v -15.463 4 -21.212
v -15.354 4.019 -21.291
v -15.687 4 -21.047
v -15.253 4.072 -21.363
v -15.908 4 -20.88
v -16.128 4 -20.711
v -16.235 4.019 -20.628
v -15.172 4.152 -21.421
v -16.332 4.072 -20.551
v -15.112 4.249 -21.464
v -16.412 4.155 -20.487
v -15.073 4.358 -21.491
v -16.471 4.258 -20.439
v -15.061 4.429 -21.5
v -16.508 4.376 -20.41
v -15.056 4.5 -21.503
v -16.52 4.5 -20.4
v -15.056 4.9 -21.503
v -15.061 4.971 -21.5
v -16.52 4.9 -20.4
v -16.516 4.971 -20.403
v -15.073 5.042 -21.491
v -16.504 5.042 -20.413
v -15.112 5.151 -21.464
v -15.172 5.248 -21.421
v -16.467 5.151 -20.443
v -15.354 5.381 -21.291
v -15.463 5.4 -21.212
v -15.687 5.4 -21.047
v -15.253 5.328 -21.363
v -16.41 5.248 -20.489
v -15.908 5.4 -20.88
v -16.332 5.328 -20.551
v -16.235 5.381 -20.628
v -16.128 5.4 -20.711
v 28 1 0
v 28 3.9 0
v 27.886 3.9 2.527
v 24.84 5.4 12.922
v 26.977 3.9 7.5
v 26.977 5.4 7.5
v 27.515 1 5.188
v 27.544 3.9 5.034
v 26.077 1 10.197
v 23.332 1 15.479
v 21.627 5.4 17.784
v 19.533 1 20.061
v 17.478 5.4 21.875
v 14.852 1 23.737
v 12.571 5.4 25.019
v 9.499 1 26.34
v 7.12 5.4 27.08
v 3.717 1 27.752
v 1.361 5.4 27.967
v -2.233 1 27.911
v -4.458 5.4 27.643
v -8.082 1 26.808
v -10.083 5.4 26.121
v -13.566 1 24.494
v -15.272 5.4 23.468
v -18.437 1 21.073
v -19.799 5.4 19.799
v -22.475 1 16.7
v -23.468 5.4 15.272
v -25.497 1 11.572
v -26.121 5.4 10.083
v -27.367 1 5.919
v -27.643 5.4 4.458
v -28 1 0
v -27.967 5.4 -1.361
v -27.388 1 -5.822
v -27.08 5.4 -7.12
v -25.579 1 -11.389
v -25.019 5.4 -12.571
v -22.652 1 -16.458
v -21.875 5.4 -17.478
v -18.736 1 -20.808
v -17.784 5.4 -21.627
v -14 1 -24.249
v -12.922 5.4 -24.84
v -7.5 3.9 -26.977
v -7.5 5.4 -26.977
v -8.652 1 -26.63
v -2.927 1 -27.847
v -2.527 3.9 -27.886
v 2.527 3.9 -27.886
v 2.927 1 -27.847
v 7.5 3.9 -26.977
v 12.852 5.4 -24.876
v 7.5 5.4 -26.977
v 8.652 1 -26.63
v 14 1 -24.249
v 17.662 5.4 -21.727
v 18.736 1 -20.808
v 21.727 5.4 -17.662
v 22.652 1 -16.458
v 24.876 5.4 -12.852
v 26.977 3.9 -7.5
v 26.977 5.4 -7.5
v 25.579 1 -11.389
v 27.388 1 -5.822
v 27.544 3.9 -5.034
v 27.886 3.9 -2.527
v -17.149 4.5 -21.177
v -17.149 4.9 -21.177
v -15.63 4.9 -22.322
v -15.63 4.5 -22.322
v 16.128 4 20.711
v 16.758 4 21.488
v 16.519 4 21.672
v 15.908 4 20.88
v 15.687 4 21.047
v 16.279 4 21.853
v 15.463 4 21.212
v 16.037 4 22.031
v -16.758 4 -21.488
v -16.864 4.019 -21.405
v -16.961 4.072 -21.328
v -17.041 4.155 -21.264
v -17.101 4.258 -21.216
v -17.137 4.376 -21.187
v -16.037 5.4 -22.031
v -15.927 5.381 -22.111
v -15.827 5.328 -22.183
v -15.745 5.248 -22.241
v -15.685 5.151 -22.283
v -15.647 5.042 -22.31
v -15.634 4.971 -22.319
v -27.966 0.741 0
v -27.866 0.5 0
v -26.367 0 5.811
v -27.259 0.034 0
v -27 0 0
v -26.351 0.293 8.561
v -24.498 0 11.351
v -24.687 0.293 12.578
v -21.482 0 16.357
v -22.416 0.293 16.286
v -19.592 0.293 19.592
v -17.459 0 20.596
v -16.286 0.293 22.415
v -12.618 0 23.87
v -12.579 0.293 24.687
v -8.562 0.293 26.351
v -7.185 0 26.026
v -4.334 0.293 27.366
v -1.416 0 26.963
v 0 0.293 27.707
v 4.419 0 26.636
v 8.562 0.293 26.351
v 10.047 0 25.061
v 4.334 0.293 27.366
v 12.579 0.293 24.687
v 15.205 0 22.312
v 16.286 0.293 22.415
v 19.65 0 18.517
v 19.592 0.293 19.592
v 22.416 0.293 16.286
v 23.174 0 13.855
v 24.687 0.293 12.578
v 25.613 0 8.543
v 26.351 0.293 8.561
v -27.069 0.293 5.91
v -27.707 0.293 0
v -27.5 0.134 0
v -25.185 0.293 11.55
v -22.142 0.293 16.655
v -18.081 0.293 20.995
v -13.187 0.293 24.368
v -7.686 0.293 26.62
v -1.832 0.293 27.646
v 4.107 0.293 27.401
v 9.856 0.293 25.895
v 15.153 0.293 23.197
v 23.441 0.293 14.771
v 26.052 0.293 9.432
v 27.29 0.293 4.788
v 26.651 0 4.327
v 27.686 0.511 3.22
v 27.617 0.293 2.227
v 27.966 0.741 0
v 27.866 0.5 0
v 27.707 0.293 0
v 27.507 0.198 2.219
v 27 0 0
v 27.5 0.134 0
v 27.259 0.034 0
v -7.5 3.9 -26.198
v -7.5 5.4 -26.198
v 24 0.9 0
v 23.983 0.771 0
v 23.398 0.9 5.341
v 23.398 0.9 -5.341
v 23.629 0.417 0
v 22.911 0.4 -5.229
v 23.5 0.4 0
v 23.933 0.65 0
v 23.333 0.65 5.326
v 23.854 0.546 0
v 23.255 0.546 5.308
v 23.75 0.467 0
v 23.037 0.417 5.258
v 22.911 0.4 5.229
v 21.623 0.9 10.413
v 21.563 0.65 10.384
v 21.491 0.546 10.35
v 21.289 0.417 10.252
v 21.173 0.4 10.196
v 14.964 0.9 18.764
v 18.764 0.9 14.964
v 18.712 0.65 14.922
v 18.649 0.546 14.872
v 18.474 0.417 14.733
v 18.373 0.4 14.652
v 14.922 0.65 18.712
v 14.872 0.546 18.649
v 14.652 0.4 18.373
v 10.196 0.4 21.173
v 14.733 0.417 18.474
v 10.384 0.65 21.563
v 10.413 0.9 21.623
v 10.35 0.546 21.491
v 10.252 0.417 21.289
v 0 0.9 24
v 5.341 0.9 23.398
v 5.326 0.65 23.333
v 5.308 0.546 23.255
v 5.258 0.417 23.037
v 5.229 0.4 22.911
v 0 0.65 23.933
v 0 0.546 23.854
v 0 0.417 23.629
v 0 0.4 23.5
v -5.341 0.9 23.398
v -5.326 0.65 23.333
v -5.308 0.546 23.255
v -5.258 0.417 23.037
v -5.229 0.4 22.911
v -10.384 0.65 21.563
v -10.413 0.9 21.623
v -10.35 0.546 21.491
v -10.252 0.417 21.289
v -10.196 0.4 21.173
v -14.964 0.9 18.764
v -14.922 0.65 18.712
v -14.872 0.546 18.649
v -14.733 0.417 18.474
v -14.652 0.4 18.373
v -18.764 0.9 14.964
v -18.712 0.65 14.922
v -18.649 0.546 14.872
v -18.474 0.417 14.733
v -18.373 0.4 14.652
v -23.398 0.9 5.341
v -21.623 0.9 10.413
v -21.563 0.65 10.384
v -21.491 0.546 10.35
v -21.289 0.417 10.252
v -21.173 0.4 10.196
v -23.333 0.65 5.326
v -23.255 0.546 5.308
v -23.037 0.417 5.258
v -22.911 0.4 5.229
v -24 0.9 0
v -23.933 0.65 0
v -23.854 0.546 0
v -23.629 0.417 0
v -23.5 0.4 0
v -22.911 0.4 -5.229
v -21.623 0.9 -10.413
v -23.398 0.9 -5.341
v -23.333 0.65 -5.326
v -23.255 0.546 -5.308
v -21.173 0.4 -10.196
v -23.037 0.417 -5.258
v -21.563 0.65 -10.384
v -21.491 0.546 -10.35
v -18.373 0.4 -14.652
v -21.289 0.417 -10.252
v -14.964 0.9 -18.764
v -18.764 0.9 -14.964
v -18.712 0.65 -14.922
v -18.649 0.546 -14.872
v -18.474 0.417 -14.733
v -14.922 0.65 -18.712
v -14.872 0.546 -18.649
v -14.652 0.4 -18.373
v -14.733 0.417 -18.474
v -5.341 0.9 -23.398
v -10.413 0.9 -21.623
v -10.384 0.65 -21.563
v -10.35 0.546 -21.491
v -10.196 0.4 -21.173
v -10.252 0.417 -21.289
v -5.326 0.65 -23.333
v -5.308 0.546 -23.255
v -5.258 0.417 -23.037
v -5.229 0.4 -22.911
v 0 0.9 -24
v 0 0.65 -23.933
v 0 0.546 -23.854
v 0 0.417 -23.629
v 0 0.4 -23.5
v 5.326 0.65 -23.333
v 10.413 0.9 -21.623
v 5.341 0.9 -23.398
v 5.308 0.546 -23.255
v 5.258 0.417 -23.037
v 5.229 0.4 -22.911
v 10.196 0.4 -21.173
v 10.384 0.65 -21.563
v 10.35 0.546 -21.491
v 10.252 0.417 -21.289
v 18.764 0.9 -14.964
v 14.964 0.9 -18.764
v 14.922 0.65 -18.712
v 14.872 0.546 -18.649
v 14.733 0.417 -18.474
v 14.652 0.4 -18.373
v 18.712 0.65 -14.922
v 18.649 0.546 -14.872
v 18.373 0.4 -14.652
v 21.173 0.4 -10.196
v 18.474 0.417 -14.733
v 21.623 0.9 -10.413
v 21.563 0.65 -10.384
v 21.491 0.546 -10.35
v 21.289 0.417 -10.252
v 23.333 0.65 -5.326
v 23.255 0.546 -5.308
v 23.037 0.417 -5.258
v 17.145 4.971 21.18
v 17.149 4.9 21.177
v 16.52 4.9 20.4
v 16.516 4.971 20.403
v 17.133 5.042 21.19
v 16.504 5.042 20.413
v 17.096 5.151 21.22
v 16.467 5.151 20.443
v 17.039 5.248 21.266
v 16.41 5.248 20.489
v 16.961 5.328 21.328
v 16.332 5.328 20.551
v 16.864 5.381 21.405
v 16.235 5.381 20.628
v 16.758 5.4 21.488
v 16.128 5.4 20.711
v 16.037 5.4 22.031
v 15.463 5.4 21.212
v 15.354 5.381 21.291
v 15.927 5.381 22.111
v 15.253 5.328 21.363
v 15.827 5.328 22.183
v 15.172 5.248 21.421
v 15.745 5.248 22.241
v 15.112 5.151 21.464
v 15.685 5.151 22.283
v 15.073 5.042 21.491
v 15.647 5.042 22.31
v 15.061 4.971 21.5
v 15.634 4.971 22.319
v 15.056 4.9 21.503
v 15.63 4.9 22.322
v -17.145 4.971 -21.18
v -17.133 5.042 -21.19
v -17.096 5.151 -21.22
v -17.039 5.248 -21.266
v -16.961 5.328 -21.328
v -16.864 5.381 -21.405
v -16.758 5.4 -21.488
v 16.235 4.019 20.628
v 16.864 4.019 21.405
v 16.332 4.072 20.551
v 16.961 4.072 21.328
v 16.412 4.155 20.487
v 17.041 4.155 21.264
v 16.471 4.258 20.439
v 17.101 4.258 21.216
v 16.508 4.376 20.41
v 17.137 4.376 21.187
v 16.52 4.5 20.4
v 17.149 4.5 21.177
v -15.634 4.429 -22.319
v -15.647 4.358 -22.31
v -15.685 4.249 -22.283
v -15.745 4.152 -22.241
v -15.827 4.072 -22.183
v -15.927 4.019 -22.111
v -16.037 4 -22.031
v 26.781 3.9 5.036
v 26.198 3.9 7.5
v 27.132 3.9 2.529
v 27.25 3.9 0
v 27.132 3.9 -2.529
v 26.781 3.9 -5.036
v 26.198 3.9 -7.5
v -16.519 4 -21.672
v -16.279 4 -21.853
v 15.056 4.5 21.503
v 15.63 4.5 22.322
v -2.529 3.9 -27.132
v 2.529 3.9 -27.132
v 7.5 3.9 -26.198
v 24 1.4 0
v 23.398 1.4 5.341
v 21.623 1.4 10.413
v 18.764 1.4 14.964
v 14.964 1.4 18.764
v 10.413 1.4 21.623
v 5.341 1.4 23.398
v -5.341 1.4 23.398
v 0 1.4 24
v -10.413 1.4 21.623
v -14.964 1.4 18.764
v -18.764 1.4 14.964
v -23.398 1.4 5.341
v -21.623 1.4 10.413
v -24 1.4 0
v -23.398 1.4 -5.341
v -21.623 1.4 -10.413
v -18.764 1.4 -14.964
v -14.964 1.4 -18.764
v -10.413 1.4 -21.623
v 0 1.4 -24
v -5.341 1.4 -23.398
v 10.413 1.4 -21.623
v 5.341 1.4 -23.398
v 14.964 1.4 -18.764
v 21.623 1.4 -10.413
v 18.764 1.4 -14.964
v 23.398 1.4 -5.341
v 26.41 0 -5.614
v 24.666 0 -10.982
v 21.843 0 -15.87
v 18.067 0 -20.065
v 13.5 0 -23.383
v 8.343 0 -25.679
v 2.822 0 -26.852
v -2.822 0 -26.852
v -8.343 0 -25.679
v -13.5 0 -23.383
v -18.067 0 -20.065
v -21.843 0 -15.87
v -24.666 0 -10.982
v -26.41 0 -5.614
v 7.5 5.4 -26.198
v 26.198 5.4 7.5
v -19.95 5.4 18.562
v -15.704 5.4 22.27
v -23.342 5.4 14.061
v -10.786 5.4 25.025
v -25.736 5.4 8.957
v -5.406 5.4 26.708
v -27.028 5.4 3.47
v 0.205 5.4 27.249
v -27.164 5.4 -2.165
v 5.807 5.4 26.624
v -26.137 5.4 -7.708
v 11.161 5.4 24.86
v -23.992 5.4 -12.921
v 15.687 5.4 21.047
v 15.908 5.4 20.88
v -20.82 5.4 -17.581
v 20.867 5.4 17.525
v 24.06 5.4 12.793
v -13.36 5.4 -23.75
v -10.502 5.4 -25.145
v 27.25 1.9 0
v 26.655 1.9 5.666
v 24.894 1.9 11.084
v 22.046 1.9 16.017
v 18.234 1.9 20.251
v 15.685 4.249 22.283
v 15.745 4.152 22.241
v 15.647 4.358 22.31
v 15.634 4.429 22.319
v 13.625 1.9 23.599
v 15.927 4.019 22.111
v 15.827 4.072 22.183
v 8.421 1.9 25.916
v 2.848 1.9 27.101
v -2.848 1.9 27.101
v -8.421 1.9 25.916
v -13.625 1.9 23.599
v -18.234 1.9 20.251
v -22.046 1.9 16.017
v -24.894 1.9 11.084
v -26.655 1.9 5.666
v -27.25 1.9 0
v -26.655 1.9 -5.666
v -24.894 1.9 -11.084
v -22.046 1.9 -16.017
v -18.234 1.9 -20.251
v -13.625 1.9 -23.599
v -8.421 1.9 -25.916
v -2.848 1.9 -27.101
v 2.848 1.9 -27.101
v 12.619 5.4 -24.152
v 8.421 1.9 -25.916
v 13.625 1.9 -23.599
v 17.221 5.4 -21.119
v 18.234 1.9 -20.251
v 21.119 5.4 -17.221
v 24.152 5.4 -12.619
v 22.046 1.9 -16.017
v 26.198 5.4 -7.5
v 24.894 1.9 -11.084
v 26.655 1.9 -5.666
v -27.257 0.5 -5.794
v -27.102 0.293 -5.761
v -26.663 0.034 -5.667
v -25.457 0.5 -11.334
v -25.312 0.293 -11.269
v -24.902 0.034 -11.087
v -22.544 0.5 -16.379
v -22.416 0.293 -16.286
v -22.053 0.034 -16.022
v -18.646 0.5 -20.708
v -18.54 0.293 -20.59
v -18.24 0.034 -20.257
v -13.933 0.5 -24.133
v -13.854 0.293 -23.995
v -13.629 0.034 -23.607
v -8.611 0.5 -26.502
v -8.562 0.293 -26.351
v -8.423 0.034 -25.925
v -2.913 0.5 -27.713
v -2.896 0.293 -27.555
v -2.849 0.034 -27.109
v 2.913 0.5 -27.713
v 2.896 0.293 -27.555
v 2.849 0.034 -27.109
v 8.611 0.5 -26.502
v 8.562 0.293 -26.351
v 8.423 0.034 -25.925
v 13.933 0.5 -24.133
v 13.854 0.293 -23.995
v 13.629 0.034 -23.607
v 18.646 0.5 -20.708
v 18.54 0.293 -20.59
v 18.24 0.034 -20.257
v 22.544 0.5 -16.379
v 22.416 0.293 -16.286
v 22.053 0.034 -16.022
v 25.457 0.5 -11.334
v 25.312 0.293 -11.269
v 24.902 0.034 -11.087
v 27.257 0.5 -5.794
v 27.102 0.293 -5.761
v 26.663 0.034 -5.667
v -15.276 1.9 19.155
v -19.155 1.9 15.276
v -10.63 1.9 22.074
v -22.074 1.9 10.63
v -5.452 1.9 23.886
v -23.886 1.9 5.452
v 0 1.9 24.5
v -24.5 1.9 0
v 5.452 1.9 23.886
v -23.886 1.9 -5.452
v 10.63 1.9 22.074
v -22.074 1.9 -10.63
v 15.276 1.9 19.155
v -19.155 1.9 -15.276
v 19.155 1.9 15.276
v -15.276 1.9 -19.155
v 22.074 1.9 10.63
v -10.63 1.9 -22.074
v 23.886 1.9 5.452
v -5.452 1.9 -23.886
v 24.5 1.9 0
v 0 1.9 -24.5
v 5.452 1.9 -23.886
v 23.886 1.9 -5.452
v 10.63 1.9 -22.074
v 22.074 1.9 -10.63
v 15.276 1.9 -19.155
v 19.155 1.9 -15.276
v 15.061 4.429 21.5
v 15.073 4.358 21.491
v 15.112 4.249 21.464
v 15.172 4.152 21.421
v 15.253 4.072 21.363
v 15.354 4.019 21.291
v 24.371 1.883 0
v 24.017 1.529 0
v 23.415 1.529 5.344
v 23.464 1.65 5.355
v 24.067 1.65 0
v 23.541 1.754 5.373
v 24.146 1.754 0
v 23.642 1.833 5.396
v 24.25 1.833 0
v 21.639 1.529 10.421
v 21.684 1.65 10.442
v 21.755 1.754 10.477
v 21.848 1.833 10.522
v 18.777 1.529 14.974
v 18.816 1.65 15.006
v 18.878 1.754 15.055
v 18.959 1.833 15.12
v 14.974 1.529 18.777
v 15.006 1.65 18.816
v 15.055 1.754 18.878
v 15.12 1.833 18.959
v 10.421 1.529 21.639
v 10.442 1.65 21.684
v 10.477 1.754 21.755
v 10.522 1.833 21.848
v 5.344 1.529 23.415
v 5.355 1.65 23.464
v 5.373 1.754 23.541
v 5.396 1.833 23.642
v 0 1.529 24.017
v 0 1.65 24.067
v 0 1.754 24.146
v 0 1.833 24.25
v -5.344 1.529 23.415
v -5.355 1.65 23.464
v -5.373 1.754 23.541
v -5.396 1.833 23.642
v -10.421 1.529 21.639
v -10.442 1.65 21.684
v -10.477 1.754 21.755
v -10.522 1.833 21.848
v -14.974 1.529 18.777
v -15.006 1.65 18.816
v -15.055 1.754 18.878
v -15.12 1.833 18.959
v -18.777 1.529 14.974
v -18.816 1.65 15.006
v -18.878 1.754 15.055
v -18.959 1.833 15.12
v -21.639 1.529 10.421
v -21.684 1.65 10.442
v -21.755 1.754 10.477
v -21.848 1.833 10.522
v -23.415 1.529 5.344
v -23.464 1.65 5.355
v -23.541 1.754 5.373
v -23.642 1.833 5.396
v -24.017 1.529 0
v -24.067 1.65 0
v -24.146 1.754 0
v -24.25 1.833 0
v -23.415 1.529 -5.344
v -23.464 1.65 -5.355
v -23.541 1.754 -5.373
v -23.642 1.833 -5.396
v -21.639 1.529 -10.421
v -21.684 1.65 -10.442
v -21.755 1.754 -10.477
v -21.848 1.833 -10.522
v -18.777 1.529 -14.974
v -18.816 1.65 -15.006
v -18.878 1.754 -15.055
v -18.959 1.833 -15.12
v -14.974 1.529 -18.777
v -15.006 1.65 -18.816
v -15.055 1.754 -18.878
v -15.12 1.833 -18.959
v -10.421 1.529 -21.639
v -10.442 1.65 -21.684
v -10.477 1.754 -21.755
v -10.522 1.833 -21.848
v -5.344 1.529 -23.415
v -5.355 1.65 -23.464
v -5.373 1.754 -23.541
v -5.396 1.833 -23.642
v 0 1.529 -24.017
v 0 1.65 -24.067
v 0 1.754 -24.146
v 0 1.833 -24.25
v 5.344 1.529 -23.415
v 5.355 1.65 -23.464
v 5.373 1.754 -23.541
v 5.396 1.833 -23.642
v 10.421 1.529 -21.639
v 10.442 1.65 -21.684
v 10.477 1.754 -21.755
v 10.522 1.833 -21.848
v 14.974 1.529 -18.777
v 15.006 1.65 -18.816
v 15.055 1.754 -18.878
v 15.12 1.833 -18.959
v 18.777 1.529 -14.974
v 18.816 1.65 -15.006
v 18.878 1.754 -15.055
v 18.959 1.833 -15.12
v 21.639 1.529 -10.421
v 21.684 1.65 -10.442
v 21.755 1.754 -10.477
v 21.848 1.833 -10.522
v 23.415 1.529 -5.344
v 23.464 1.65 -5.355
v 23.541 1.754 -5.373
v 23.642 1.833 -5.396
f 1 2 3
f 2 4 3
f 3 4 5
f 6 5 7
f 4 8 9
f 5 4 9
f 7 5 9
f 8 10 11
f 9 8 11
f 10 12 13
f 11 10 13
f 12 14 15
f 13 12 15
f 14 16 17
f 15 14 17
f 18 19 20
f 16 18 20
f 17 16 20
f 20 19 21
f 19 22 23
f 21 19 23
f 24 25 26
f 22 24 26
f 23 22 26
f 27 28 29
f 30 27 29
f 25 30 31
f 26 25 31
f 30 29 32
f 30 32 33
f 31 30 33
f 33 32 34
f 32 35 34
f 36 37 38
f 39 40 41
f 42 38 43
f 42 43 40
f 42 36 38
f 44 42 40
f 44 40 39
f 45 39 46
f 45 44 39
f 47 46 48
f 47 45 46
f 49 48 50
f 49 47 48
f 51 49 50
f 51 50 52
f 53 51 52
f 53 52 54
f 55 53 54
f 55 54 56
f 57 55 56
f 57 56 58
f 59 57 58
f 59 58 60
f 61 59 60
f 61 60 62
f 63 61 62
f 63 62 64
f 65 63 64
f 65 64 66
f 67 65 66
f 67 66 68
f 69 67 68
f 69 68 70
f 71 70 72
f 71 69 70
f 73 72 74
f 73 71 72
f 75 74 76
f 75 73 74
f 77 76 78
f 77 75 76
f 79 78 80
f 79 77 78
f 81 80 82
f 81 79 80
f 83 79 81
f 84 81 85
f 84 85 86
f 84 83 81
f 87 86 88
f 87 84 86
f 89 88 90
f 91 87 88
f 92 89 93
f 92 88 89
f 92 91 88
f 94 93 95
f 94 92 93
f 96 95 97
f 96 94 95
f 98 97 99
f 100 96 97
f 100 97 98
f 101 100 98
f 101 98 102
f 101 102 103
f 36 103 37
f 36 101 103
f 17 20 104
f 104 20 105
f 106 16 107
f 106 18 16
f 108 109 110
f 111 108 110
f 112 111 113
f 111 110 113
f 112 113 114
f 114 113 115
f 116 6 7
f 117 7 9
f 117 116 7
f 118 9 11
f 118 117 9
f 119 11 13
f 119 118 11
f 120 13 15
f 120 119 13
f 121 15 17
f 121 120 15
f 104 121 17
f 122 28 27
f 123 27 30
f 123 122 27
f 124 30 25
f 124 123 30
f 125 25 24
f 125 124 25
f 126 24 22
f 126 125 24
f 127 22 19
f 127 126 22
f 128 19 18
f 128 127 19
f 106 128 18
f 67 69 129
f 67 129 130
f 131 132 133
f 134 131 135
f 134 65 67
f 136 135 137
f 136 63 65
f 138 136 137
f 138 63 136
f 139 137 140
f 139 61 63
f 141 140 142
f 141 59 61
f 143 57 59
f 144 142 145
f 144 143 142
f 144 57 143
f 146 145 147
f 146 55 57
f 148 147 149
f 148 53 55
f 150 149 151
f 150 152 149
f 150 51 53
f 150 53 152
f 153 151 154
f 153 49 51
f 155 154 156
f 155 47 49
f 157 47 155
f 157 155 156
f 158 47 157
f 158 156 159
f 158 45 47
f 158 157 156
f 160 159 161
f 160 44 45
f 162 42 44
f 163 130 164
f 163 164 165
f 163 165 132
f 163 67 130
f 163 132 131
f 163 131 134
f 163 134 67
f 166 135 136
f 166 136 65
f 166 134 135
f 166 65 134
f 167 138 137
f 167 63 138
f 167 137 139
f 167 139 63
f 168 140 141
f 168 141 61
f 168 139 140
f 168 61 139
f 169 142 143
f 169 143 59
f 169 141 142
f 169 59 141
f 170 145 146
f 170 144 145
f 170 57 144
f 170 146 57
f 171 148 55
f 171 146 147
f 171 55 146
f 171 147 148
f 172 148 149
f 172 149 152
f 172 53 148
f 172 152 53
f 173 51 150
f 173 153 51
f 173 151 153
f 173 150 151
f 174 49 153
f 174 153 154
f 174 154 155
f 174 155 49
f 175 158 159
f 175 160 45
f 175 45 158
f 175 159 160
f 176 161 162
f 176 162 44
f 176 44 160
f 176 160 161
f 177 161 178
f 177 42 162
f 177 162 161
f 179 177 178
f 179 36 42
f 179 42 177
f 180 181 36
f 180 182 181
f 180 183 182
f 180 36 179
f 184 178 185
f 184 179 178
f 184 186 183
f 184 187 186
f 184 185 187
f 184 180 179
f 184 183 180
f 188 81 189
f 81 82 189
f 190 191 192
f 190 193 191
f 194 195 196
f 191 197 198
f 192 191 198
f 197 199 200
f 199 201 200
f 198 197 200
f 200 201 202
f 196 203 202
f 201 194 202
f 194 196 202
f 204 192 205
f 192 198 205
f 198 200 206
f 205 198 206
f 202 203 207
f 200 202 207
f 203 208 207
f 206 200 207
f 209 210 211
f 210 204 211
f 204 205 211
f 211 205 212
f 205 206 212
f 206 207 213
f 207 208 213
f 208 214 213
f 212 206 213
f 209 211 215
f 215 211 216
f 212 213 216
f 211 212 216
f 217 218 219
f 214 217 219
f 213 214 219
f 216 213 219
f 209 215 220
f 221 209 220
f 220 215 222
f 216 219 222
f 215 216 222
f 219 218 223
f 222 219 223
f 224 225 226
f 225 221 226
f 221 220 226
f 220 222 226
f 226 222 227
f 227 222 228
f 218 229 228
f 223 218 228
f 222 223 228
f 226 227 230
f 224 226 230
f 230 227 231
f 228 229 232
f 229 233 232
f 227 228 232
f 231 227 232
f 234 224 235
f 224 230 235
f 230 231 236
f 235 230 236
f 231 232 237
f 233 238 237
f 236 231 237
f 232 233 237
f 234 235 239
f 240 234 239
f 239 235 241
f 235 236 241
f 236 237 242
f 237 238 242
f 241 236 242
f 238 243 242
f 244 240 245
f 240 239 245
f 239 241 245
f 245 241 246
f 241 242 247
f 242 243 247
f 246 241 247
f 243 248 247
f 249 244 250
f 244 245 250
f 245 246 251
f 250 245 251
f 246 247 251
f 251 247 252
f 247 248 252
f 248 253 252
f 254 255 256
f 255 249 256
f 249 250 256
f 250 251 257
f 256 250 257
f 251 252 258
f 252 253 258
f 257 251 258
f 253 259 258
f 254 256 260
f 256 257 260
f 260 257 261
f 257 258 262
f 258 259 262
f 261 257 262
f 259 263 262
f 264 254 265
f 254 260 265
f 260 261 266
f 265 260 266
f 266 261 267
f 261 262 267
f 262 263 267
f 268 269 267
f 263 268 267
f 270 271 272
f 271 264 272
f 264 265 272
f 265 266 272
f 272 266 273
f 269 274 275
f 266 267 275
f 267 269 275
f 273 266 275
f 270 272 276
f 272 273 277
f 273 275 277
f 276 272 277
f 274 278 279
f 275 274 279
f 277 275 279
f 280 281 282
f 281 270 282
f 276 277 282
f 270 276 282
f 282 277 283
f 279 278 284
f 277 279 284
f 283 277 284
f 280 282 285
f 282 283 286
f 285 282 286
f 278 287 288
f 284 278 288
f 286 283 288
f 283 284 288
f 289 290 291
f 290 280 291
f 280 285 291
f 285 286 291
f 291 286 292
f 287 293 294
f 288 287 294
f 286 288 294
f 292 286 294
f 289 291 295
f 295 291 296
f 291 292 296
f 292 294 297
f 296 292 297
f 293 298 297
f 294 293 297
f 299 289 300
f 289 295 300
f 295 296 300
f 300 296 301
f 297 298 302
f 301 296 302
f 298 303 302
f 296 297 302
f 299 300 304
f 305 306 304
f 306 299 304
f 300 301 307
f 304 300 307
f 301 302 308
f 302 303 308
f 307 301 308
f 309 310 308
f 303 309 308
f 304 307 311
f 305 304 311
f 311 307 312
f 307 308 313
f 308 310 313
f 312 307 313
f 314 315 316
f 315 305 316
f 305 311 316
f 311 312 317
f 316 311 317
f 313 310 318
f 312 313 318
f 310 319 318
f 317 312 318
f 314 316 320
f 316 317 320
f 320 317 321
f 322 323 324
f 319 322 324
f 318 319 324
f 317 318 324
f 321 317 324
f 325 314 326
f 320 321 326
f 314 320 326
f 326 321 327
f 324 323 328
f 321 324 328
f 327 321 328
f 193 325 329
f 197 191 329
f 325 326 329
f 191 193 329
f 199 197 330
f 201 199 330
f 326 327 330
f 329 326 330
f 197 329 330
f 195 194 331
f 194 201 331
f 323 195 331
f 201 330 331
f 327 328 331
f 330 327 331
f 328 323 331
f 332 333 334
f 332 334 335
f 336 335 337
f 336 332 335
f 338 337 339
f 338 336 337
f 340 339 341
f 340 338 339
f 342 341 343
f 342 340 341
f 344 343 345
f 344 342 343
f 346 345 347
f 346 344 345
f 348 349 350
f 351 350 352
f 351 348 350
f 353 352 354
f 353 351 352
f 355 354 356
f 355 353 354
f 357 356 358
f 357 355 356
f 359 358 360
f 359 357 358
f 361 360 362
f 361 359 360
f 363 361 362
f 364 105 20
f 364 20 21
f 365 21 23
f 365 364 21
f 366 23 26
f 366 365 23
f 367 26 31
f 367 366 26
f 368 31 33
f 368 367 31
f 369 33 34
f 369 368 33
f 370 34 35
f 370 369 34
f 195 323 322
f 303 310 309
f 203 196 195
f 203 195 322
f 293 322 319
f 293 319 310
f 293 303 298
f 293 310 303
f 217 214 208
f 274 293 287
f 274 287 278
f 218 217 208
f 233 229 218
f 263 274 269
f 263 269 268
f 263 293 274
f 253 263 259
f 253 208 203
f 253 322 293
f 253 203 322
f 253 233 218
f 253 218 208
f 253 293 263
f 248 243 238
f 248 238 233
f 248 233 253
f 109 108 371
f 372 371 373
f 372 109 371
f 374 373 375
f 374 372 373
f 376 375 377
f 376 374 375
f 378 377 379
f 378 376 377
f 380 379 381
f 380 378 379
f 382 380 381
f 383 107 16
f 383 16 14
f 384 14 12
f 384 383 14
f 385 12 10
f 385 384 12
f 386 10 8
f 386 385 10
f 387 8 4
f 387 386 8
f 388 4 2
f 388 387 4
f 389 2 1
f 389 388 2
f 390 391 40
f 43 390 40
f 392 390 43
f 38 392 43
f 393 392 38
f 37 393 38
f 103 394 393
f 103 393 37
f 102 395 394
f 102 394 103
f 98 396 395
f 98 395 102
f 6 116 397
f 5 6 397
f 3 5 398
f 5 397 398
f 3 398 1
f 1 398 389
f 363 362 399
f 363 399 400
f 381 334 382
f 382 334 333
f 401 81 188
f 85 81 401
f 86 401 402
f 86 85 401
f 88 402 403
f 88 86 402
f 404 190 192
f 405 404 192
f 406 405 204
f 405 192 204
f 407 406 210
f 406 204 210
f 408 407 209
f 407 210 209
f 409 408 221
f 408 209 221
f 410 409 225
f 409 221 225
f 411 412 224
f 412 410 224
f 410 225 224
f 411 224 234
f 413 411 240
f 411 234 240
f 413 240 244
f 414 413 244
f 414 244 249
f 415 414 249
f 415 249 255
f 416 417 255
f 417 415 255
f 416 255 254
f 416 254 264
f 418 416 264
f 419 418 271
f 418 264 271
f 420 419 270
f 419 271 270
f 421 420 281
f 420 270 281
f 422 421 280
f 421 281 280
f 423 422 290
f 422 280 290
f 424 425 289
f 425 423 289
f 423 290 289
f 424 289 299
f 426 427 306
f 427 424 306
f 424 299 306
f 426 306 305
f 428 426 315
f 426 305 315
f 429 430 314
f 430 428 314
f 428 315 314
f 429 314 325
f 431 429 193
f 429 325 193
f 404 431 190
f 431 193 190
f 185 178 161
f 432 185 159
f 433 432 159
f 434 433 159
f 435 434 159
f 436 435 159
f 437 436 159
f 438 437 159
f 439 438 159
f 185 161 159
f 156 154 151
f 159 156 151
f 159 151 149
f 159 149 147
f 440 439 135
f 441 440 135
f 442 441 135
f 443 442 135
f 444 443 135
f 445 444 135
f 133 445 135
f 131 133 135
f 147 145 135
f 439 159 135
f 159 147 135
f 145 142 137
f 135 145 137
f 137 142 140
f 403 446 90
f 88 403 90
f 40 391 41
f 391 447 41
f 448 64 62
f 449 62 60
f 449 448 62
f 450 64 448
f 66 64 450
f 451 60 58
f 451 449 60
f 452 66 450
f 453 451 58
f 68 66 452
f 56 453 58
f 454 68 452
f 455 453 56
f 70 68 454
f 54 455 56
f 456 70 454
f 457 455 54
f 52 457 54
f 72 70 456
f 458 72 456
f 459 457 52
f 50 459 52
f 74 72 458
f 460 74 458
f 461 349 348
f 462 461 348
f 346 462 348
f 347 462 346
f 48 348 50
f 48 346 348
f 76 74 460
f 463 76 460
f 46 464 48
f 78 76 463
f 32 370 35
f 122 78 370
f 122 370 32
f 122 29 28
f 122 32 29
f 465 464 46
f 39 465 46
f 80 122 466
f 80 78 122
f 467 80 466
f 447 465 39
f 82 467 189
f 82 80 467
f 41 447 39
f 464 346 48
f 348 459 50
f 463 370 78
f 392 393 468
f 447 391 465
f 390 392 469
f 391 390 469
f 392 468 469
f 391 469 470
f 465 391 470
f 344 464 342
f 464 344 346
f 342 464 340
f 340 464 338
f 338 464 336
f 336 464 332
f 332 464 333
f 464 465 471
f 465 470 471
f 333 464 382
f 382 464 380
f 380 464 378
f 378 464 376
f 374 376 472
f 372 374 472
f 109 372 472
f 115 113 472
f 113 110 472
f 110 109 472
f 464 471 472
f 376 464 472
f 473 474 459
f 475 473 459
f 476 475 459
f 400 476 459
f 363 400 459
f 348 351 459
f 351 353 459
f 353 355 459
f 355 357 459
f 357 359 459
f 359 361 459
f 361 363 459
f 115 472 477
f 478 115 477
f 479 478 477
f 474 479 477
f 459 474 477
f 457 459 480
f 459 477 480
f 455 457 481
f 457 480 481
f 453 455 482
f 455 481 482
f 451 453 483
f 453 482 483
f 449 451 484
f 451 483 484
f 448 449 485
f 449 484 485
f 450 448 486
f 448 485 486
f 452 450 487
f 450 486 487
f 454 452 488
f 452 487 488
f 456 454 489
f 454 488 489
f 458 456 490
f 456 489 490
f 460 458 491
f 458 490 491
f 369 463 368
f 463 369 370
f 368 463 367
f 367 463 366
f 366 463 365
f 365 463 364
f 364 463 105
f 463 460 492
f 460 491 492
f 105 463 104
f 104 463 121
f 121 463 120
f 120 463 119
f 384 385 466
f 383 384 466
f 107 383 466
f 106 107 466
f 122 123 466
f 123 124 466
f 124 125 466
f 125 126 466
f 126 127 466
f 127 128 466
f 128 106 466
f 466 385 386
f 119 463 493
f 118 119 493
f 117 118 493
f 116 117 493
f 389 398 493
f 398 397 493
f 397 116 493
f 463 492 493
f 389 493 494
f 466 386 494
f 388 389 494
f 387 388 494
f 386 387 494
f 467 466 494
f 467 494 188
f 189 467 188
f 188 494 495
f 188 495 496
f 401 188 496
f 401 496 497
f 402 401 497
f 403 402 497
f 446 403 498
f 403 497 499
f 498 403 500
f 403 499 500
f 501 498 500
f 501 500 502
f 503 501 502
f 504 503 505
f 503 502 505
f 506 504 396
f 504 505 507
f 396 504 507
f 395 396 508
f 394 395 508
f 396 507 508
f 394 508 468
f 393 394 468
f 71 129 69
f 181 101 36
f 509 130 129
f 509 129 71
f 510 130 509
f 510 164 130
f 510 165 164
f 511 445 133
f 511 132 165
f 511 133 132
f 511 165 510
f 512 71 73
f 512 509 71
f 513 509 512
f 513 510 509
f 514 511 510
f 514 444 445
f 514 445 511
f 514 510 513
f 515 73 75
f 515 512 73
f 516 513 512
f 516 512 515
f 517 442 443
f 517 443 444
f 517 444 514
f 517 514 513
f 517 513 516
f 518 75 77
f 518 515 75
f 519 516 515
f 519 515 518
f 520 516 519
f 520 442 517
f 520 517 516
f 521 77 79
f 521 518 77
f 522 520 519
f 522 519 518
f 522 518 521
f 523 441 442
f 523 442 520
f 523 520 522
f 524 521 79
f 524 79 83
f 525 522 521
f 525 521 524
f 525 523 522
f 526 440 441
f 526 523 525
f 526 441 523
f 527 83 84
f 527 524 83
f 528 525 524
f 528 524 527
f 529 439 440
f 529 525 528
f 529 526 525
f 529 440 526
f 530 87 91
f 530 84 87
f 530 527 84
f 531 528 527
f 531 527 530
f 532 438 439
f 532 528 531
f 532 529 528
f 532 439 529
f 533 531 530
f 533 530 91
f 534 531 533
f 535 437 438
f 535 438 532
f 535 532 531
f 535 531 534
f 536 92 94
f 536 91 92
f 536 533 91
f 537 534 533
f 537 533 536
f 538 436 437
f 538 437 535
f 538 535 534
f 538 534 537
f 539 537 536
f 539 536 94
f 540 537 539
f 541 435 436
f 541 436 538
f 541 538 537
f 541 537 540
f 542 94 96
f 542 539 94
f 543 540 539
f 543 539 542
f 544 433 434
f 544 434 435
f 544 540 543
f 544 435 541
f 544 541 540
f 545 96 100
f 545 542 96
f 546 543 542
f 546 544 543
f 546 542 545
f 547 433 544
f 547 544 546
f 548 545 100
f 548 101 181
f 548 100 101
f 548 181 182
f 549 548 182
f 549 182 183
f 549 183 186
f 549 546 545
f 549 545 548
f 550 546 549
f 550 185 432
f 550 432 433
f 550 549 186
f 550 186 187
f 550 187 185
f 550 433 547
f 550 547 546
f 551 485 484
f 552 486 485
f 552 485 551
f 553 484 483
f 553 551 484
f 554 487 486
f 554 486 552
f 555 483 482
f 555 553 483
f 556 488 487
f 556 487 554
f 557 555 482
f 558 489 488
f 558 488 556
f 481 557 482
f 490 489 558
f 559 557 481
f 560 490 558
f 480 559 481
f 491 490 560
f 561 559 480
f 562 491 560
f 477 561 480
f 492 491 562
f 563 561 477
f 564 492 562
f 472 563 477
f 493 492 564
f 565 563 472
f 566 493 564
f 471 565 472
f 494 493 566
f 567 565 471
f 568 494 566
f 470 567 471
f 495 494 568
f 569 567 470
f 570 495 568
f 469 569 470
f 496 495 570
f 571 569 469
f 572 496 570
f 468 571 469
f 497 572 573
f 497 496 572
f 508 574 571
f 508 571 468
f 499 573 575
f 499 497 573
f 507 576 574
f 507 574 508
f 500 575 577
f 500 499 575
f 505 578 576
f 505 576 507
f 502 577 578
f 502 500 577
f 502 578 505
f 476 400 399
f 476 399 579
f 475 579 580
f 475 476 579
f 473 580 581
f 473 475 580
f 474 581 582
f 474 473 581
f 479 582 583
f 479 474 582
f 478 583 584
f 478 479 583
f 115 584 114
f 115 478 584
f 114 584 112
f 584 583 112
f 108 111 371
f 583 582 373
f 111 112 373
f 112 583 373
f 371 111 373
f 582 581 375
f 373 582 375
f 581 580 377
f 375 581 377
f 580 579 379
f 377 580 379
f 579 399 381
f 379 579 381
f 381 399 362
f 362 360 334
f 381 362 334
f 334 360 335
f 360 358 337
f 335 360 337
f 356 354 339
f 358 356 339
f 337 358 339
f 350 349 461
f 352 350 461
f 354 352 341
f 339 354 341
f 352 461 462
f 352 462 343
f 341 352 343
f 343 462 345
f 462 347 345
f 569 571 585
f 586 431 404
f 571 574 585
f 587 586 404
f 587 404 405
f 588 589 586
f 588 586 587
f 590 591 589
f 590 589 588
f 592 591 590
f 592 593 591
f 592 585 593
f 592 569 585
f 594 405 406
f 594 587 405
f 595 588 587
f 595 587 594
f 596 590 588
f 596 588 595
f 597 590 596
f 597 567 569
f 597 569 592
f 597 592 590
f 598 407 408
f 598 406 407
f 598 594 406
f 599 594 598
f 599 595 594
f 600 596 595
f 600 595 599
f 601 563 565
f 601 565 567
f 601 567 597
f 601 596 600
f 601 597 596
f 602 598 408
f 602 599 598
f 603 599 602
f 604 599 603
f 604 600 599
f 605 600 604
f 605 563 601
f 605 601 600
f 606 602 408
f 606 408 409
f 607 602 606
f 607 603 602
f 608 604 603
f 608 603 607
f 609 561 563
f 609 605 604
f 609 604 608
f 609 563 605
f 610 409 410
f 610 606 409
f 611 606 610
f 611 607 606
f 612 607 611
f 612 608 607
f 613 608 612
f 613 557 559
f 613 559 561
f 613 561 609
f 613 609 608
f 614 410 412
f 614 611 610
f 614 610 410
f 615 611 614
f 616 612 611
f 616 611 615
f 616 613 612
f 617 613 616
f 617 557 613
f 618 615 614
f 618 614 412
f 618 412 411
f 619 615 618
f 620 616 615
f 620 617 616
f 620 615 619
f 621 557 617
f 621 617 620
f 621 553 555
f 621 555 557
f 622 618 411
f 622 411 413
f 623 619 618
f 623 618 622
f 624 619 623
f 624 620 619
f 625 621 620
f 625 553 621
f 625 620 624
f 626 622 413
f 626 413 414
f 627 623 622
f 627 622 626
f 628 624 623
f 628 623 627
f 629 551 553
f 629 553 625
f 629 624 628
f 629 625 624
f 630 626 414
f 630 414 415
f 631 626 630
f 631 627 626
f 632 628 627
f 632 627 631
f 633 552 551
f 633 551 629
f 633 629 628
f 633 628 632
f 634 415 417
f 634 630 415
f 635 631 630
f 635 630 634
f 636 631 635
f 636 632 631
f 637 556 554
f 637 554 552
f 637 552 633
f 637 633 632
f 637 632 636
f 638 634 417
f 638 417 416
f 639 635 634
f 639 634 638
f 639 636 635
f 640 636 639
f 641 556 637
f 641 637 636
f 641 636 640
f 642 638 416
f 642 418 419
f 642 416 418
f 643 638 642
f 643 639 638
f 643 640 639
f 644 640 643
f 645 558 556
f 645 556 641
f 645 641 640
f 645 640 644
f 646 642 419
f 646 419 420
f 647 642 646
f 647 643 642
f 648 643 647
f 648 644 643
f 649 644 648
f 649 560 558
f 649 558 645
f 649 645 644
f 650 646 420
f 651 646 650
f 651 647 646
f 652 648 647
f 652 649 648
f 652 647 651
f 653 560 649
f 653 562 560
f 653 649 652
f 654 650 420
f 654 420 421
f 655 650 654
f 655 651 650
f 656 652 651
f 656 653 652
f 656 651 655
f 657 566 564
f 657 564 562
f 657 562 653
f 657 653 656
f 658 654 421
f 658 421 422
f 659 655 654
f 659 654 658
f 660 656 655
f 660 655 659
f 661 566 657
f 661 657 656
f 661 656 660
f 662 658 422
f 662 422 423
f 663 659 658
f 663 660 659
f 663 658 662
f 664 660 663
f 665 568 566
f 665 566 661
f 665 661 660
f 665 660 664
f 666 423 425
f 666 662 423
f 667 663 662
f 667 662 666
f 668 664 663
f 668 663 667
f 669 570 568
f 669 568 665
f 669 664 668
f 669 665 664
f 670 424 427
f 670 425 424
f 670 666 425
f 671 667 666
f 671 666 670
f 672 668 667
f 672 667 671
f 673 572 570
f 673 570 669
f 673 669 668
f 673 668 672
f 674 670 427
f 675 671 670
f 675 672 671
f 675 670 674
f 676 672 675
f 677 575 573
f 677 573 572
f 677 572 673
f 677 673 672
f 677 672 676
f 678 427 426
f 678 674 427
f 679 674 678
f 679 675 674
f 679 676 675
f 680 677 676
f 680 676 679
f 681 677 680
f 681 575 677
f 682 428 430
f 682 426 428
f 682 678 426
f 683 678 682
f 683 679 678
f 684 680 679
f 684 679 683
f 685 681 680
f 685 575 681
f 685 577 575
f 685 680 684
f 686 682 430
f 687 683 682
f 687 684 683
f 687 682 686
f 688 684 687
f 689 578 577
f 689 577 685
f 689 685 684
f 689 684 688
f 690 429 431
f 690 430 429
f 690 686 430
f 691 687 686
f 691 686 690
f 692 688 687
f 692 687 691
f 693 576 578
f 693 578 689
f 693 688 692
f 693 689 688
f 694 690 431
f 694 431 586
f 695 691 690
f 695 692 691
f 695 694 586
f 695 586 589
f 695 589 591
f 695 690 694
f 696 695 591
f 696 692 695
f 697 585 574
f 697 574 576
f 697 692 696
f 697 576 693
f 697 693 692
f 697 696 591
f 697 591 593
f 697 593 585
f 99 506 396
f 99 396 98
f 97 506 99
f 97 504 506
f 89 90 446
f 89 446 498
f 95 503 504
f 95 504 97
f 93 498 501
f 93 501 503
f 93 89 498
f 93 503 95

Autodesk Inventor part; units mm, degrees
ref_plane "YZ Plane" through (0, 0, 0) normal (1, 0, 0) x (0, 1, 0)
ref_plane "XZ Plane" through (0, 0, 0) normal (0, 1, 0) x (-1, 0, 0)
ref_plane "XY Plane" through (0, 0, 0) normal (0, 0, 1) x (1, 0, 0)
sketch "Sketch1" plane through (0, 0, 0) normal (0, 1, 0) x (-1, 0, 0)
  circle A0 centre (0, 0) radius 28
  dimension "d7" = 56
extrude "Extrusion1" add sketch "Sketch1" along normal blind 0.4
sketch "Sketch2" plane through (0, 0.4, 0) normal (0, 1, 0) x (1, 0, 0)
  circle A0 centre (0, 0) radius 27.25
  circle A1 centre (0, 0) radius 28
  dimension "d4" = 54.5
  dimension "d8" = 56
extrude "Extrusion2" add sketch "Sketch2" along normal blind 5
sketch "Sketch3" plane through (0, 5.4, 0) normal (0, 1, 0) x (1, 0, 0)
  arc A0 (-15.63, 22.3219) -> (-17.149, 21.1772) centre (0, 0) ccw
  line L0 (0, 0) -> (-17.149, 21.1772) construction
  line L1 (0, 0) -> (27.25, 0) construction
  line L2 (0, 0) -> (-15.63, 22.3219) construction
  arc A1 (-15.0564, 21.5027) -> (-16.5197, 20.4001) centre (0, 0) ccw
  line L3 (0, 0) -> (-16.5197, 20.4001) construction
  line L4 (0, 0) -> (26.25, 0) construction
  line L5 (0, 0) -> (-15.0564, 21.5027) construction
  line L6 (-16.5197, 20.4001) -> (-17.149, 21.1772)
  line L7 (-15.0564, 21.5027) -> (-15.63, 22.3219)
  circle A2 centre (0, 0) radius 27.25 projected
  dimension "d9" = 27.25
  dimension "d10" = 129
  dimension "d11" = 4
  dimension "d12" = 26.25
  dimension "d13" = 129
  dimension "d14" = 4
extrude "Extrusion3" add sketch "Sketch3" against normal blind 1.4 contours L7 A1 L6 A0
fillet "Fillet1" radius 0.5 4 edges at (-15.3432, 4, -21.9123) (-15.3432, 5.4, -21.9123) (-16.8343, 5.4, -20.7887) (-16.8343, 4, -20.7887)
pattern_circular "Circular Pattern1" count 2 over 360 about axis through (0, 0, 0) along (0, 1, 0) of "Extrusion3", "Fillet1"
sketch "Sketch4" plane through (0, 5.4, 0) normal (0, 1, 0) x (1, 0, 0)
  circle A0 centre (0, 0) radius 28 projected
  line L0 (0, 28) -> (-7.5, 28)
  line L1 (-7.5, 28) -> (-7.5, 25)
  line L2 (-7.5, 25) -> (0, 25)
  line L3 (0, 25) -> (0, 28)
  line L4 (0, 25) -> (7.5, 25)
  line L5 (7.5, 25) -> (7.5, 28)
  line L6 (7.5, 28) -> (0, 28)
  line L7 (0, 28) -> (0, 25)
  circle A1 centre (0, 0) radius 28 projected
  line L8 (28, 0) -> (25, 0)
  line L9 (25, 0) -> (25, 7.5)
  line L10 (25, 7.5) -> (28, 7.5)
  line L11 (28, 7.5) -> (28, 0)
  line L12 (28, 0) -> (25, 0)
  line L13 (25, 0) -> (25, -7.5)
  line L14 (25, -7.5) -> (28, -7.5)
  line L15 (28, -7.5) -> (28, 0)
  dimension "d25" = 7.5
  dimension "d26" = 3
  dimension "d27" = 7.5
  dimension "d28" = 3
  dimension "d51" = 3
  dimension "d52" = 7.5
  dimension "d53" = 3
  dimension "d54" = 7.5
extrude "Extrusion4" cut sketch "Sketch4" against normal blind 1.5 contours L8 L9 L10 A0 | L15 L14 A0 | A0 L14 L13 L8 | A0 L10 L11 | L5 L4 L3 A0 | A0 L6 L5 | L1 L0 A0 | A0 L3 L2 L1
sketch "Sketch7" plane through (0, 0.4, 0) normal (0, 1, 0) x (1, 0, 0)
  circle A0 centre (0, 0) radius 24
  circle A1 centre (0, 0) radius 27.25
  dimension "d47" = 48
  dimension "d50" = 54.5
extrude "Extrusion7" add sketch "Sketch7" along normal blind 1.5
fillet "Fillet5" radius 1 1 edges at (28, 0, 0)
fillet "Fillet5" radius 0.5 2 edges at (-24, 0.4, 0) (-24, 1.9, 0)
properties part number "Diffuser_V1"
